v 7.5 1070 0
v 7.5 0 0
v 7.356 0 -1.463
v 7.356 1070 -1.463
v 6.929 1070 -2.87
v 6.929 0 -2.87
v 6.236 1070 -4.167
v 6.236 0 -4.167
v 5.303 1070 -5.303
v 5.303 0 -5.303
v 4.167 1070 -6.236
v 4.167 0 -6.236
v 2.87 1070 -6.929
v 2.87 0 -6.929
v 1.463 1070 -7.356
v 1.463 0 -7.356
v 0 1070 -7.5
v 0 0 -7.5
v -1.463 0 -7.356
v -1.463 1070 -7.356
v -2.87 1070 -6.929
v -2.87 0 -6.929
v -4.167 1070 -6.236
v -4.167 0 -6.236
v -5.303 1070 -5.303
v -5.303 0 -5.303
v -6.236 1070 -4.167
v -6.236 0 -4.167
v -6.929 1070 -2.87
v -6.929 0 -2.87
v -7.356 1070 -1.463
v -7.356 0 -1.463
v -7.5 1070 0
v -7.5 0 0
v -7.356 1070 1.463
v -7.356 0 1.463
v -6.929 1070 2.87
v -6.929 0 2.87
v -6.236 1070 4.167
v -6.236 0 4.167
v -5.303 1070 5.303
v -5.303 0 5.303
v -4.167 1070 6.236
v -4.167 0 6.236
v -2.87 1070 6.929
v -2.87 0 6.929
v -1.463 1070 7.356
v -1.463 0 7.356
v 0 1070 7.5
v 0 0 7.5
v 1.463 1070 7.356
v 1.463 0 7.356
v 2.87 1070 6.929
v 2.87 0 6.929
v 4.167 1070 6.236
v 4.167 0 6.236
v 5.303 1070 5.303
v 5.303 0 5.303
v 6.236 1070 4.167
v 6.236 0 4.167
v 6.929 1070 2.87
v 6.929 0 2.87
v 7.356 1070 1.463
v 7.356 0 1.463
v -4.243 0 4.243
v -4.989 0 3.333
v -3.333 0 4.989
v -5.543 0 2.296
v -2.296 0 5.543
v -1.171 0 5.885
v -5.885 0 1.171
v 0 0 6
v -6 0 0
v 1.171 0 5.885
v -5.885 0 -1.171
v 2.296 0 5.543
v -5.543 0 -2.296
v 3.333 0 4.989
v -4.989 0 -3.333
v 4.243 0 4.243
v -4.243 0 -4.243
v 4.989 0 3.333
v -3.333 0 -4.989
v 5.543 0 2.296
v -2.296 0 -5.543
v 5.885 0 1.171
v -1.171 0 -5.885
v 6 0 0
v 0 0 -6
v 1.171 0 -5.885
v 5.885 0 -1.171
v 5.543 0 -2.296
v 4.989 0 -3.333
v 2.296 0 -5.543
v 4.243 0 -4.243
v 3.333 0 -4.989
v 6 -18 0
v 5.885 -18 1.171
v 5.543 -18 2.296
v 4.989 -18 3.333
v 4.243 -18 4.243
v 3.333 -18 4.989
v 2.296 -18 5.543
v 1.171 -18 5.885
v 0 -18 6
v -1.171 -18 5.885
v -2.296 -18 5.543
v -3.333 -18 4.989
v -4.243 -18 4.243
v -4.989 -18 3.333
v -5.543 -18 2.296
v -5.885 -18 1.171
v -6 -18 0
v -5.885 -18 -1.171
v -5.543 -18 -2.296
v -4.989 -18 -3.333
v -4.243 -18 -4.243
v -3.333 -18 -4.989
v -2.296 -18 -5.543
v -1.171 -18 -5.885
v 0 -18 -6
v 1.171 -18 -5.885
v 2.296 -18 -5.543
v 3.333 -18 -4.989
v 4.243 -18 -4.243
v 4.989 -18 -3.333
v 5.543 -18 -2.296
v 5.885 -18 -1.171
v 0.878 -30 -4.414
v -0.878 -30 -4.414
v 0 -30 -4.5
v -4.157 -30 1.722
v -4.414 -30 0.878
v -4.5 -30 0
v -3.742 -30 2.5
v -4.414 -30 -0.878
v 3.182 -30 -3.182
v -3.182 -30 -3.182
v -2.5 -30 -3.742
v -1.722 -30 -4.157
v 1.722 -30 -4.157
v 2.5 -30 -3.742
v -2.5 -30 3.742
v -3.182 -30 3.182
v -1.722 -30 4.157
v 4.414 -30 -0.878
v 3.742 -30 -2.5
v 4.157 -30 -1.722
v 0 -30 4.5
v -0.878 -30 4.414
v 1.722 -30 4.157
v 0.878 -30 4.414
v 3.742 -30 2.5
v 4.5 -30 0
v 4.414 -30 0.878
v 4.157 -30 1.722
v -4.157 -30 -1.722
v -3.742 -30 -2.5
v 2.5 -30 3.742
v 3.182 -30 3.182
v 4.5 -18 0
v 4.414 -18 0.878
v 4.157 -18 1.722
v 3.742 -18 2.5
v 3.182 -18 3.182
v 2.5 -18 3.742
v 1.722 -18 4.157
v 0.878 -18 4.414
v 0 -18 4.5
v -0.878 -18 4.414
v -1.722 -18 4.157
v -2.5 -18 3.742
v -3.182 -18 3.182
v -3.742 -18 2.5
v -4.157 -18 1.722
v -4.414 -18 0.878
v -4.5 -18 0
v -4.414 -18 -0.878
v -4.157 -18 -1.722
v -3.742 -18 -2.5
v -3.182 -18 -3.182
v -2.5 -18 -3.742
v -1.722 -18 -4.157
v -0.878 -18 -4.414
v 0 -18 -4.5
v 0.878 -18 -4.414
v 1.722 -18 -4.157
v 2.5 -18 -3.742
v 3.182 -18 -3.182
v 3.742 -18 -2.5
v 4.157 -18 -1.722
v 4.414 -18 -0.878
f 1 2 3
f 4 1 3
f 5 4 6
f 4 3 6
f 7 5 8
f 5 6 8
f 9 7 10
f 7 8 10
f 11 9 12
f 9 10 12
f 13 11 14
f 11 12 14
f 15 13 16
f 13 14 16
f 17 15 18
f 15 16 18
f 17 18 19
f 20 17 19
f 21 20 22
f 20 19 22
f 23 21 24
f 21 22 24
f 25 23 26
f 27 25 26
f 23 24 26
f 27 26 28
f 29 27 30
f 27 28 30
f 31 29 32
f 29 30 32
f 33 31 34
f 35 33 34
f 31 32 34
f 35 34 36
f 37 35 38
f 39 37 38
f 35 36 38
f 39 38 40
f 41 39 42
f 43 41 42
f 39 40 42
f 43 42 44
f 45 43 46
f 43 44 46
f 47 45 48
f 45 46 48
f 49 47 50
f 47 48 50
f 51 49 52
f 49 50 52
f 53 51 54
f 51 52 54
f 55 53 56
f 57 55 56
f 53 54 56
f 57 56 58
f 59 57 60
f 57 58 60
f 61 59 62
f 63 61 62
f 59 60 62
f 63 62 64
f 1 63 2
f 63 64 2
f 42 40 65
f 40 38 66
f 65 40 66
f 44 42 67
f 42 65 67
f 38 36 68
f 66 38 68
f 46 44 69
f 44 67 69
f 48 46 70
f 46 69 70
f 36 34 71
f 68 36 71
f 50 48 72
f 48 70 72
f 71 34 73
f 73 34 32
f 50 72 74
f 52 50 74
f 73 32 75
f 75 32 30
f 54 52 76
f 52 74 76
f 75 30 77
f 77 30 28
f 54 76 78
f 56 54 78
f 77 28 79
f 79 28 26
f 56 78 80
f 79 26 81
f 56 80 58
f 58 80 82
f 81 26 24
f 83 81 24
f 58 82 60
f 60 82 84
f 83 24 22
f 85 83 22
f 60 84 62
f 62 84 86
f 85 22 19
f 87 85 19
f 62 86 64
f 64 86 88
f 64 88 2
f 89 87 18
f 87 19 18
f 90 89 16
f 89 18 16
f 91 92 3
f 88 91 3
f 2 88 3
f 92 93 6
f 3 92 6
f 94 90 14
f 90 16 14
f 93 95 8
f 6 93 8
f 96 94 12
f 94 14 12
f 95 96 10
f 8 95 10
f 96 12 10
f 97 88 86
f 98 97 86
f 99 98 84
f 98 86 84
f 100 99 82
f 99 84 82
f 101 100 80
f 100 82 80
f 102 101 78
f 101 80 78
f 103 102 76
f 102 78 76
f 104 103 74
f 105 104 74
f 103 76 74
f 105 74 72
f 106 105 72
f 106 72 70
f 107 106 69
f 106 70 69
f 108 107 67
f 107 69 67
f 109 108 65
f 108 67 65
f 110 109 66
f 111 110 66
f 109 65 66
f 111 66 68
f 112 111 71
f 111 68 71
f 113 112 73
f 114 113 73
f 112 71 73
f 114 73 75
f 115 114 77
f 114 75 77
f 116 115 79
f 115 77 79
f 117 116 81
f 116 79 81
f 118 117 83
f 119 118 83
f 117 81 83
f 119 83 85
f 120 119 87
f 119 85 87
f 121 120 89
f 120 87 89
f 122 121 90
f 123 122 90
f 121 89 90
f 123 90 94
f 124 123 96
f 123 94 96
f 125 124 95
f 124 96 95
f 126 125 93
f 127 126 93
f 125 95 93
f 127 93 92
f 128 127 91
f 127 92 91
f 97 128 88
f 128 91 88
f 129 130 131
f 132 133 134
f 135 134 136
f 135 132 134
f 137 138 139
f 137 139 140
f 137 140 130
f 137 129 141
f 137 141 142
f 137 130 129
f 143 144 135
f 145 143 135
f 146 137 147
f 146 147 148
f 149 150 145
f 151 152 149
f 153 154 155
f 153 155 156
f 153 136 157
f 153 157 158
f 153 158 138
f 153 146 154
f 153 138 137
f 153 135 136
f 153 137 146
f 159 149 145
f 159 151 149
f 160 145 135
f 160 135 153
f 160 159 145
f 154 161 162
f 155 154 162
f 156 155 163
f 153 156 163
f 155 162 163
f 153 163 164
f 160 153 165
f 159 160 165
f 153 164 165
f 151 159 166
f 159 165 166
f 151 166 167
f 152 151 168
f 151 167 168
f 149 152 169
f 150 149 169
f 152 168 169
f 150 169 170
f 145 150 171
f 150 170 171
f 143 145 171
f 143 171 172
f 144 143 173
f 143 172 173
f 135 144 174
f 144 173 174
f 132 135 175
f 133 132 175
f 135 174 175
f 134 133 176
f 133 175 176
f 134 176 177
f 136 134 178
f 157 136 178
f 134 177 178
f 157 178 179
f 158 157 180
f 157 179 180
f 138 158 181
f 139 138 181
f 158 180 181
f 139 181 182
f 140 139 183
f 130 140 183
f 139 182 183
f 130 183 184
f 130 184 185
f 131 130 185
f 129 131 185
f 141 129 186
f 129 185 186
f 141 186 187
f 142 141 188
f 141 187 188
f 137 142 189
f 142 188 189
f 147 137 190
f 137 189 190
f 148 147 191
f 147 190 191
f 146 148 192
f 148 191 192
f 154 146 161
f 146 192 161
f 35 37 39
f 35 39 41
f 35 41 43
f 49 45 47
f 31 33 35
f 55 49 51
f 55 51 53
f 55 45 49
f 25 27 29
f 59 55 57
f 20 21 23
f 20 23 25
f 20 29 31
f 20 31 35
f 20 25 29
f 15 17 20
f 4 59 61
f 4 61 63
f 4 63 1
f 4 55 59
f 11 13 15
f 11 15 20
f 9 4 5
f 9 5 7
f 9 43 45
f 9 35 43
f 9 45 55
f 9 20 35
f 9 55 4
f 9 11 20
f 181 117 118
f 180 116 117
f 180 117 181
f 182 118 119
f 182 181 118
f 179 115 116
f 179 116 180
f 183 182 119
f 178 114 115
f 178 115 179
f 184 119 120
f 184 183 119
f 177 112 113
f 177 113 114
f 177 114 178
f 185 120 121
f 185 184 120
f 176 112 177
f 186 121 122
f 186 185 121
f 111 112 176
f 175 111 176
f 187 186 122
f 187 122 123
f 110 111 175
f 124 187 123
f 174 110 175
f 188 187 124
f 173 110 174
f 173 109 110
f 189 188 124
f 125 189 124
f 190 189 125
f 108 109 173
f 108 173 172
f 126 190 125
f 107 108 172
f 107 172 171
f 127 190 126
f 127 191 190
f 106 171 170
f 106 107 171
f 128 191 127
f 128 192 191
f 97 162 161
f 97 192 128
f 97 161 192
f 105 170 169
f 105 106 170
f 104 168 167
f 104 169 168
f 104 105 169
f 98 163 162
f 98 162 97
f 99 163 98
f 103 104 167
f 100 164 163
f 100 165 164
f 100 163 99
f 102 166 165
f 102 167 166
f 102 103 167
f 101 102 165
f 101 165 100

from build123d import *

# Parameters (mm, degrees)
SKETCH1_R           = 7.5
BOSS_EXTRUDE1_DEPTH = 1070
SKETCH_1_R          = 6
EXTRUDE_1_DEPTH     = 18
SKETCH_2_R          = 4.5
EXTRUDE_2_DEPTH     = 12


with BuildPart() as part:
    # Sketch1 → Boss-Extrude1 (new body)
    with BuildSketch(Plane(origin=(0, 0, 0), x_dir=(1, 0, 0), z_dir=(0, 1, 0))):
        Circle(SKETCH1_R)
    extrude(amount=BOSS_EXTRUDE1_DEPTH)

    # Эскиз1 → Бобышка-Вытянуть1 (add)
    with BuildSketch(Plane.XZ):
        Circle(SKETCH_1_R)
    extrude(amount=EXTRUDE_1_DEPTH)

    # Эскиз2 → Бобышка-Вытянуть2 (add)
    with BuildSketch(Plane.XZ.offset(18)):
        Circle(SKETCH_2_R)
    extrude(amount=EXTRUDE_2_DEPTH)


solid = part.part
